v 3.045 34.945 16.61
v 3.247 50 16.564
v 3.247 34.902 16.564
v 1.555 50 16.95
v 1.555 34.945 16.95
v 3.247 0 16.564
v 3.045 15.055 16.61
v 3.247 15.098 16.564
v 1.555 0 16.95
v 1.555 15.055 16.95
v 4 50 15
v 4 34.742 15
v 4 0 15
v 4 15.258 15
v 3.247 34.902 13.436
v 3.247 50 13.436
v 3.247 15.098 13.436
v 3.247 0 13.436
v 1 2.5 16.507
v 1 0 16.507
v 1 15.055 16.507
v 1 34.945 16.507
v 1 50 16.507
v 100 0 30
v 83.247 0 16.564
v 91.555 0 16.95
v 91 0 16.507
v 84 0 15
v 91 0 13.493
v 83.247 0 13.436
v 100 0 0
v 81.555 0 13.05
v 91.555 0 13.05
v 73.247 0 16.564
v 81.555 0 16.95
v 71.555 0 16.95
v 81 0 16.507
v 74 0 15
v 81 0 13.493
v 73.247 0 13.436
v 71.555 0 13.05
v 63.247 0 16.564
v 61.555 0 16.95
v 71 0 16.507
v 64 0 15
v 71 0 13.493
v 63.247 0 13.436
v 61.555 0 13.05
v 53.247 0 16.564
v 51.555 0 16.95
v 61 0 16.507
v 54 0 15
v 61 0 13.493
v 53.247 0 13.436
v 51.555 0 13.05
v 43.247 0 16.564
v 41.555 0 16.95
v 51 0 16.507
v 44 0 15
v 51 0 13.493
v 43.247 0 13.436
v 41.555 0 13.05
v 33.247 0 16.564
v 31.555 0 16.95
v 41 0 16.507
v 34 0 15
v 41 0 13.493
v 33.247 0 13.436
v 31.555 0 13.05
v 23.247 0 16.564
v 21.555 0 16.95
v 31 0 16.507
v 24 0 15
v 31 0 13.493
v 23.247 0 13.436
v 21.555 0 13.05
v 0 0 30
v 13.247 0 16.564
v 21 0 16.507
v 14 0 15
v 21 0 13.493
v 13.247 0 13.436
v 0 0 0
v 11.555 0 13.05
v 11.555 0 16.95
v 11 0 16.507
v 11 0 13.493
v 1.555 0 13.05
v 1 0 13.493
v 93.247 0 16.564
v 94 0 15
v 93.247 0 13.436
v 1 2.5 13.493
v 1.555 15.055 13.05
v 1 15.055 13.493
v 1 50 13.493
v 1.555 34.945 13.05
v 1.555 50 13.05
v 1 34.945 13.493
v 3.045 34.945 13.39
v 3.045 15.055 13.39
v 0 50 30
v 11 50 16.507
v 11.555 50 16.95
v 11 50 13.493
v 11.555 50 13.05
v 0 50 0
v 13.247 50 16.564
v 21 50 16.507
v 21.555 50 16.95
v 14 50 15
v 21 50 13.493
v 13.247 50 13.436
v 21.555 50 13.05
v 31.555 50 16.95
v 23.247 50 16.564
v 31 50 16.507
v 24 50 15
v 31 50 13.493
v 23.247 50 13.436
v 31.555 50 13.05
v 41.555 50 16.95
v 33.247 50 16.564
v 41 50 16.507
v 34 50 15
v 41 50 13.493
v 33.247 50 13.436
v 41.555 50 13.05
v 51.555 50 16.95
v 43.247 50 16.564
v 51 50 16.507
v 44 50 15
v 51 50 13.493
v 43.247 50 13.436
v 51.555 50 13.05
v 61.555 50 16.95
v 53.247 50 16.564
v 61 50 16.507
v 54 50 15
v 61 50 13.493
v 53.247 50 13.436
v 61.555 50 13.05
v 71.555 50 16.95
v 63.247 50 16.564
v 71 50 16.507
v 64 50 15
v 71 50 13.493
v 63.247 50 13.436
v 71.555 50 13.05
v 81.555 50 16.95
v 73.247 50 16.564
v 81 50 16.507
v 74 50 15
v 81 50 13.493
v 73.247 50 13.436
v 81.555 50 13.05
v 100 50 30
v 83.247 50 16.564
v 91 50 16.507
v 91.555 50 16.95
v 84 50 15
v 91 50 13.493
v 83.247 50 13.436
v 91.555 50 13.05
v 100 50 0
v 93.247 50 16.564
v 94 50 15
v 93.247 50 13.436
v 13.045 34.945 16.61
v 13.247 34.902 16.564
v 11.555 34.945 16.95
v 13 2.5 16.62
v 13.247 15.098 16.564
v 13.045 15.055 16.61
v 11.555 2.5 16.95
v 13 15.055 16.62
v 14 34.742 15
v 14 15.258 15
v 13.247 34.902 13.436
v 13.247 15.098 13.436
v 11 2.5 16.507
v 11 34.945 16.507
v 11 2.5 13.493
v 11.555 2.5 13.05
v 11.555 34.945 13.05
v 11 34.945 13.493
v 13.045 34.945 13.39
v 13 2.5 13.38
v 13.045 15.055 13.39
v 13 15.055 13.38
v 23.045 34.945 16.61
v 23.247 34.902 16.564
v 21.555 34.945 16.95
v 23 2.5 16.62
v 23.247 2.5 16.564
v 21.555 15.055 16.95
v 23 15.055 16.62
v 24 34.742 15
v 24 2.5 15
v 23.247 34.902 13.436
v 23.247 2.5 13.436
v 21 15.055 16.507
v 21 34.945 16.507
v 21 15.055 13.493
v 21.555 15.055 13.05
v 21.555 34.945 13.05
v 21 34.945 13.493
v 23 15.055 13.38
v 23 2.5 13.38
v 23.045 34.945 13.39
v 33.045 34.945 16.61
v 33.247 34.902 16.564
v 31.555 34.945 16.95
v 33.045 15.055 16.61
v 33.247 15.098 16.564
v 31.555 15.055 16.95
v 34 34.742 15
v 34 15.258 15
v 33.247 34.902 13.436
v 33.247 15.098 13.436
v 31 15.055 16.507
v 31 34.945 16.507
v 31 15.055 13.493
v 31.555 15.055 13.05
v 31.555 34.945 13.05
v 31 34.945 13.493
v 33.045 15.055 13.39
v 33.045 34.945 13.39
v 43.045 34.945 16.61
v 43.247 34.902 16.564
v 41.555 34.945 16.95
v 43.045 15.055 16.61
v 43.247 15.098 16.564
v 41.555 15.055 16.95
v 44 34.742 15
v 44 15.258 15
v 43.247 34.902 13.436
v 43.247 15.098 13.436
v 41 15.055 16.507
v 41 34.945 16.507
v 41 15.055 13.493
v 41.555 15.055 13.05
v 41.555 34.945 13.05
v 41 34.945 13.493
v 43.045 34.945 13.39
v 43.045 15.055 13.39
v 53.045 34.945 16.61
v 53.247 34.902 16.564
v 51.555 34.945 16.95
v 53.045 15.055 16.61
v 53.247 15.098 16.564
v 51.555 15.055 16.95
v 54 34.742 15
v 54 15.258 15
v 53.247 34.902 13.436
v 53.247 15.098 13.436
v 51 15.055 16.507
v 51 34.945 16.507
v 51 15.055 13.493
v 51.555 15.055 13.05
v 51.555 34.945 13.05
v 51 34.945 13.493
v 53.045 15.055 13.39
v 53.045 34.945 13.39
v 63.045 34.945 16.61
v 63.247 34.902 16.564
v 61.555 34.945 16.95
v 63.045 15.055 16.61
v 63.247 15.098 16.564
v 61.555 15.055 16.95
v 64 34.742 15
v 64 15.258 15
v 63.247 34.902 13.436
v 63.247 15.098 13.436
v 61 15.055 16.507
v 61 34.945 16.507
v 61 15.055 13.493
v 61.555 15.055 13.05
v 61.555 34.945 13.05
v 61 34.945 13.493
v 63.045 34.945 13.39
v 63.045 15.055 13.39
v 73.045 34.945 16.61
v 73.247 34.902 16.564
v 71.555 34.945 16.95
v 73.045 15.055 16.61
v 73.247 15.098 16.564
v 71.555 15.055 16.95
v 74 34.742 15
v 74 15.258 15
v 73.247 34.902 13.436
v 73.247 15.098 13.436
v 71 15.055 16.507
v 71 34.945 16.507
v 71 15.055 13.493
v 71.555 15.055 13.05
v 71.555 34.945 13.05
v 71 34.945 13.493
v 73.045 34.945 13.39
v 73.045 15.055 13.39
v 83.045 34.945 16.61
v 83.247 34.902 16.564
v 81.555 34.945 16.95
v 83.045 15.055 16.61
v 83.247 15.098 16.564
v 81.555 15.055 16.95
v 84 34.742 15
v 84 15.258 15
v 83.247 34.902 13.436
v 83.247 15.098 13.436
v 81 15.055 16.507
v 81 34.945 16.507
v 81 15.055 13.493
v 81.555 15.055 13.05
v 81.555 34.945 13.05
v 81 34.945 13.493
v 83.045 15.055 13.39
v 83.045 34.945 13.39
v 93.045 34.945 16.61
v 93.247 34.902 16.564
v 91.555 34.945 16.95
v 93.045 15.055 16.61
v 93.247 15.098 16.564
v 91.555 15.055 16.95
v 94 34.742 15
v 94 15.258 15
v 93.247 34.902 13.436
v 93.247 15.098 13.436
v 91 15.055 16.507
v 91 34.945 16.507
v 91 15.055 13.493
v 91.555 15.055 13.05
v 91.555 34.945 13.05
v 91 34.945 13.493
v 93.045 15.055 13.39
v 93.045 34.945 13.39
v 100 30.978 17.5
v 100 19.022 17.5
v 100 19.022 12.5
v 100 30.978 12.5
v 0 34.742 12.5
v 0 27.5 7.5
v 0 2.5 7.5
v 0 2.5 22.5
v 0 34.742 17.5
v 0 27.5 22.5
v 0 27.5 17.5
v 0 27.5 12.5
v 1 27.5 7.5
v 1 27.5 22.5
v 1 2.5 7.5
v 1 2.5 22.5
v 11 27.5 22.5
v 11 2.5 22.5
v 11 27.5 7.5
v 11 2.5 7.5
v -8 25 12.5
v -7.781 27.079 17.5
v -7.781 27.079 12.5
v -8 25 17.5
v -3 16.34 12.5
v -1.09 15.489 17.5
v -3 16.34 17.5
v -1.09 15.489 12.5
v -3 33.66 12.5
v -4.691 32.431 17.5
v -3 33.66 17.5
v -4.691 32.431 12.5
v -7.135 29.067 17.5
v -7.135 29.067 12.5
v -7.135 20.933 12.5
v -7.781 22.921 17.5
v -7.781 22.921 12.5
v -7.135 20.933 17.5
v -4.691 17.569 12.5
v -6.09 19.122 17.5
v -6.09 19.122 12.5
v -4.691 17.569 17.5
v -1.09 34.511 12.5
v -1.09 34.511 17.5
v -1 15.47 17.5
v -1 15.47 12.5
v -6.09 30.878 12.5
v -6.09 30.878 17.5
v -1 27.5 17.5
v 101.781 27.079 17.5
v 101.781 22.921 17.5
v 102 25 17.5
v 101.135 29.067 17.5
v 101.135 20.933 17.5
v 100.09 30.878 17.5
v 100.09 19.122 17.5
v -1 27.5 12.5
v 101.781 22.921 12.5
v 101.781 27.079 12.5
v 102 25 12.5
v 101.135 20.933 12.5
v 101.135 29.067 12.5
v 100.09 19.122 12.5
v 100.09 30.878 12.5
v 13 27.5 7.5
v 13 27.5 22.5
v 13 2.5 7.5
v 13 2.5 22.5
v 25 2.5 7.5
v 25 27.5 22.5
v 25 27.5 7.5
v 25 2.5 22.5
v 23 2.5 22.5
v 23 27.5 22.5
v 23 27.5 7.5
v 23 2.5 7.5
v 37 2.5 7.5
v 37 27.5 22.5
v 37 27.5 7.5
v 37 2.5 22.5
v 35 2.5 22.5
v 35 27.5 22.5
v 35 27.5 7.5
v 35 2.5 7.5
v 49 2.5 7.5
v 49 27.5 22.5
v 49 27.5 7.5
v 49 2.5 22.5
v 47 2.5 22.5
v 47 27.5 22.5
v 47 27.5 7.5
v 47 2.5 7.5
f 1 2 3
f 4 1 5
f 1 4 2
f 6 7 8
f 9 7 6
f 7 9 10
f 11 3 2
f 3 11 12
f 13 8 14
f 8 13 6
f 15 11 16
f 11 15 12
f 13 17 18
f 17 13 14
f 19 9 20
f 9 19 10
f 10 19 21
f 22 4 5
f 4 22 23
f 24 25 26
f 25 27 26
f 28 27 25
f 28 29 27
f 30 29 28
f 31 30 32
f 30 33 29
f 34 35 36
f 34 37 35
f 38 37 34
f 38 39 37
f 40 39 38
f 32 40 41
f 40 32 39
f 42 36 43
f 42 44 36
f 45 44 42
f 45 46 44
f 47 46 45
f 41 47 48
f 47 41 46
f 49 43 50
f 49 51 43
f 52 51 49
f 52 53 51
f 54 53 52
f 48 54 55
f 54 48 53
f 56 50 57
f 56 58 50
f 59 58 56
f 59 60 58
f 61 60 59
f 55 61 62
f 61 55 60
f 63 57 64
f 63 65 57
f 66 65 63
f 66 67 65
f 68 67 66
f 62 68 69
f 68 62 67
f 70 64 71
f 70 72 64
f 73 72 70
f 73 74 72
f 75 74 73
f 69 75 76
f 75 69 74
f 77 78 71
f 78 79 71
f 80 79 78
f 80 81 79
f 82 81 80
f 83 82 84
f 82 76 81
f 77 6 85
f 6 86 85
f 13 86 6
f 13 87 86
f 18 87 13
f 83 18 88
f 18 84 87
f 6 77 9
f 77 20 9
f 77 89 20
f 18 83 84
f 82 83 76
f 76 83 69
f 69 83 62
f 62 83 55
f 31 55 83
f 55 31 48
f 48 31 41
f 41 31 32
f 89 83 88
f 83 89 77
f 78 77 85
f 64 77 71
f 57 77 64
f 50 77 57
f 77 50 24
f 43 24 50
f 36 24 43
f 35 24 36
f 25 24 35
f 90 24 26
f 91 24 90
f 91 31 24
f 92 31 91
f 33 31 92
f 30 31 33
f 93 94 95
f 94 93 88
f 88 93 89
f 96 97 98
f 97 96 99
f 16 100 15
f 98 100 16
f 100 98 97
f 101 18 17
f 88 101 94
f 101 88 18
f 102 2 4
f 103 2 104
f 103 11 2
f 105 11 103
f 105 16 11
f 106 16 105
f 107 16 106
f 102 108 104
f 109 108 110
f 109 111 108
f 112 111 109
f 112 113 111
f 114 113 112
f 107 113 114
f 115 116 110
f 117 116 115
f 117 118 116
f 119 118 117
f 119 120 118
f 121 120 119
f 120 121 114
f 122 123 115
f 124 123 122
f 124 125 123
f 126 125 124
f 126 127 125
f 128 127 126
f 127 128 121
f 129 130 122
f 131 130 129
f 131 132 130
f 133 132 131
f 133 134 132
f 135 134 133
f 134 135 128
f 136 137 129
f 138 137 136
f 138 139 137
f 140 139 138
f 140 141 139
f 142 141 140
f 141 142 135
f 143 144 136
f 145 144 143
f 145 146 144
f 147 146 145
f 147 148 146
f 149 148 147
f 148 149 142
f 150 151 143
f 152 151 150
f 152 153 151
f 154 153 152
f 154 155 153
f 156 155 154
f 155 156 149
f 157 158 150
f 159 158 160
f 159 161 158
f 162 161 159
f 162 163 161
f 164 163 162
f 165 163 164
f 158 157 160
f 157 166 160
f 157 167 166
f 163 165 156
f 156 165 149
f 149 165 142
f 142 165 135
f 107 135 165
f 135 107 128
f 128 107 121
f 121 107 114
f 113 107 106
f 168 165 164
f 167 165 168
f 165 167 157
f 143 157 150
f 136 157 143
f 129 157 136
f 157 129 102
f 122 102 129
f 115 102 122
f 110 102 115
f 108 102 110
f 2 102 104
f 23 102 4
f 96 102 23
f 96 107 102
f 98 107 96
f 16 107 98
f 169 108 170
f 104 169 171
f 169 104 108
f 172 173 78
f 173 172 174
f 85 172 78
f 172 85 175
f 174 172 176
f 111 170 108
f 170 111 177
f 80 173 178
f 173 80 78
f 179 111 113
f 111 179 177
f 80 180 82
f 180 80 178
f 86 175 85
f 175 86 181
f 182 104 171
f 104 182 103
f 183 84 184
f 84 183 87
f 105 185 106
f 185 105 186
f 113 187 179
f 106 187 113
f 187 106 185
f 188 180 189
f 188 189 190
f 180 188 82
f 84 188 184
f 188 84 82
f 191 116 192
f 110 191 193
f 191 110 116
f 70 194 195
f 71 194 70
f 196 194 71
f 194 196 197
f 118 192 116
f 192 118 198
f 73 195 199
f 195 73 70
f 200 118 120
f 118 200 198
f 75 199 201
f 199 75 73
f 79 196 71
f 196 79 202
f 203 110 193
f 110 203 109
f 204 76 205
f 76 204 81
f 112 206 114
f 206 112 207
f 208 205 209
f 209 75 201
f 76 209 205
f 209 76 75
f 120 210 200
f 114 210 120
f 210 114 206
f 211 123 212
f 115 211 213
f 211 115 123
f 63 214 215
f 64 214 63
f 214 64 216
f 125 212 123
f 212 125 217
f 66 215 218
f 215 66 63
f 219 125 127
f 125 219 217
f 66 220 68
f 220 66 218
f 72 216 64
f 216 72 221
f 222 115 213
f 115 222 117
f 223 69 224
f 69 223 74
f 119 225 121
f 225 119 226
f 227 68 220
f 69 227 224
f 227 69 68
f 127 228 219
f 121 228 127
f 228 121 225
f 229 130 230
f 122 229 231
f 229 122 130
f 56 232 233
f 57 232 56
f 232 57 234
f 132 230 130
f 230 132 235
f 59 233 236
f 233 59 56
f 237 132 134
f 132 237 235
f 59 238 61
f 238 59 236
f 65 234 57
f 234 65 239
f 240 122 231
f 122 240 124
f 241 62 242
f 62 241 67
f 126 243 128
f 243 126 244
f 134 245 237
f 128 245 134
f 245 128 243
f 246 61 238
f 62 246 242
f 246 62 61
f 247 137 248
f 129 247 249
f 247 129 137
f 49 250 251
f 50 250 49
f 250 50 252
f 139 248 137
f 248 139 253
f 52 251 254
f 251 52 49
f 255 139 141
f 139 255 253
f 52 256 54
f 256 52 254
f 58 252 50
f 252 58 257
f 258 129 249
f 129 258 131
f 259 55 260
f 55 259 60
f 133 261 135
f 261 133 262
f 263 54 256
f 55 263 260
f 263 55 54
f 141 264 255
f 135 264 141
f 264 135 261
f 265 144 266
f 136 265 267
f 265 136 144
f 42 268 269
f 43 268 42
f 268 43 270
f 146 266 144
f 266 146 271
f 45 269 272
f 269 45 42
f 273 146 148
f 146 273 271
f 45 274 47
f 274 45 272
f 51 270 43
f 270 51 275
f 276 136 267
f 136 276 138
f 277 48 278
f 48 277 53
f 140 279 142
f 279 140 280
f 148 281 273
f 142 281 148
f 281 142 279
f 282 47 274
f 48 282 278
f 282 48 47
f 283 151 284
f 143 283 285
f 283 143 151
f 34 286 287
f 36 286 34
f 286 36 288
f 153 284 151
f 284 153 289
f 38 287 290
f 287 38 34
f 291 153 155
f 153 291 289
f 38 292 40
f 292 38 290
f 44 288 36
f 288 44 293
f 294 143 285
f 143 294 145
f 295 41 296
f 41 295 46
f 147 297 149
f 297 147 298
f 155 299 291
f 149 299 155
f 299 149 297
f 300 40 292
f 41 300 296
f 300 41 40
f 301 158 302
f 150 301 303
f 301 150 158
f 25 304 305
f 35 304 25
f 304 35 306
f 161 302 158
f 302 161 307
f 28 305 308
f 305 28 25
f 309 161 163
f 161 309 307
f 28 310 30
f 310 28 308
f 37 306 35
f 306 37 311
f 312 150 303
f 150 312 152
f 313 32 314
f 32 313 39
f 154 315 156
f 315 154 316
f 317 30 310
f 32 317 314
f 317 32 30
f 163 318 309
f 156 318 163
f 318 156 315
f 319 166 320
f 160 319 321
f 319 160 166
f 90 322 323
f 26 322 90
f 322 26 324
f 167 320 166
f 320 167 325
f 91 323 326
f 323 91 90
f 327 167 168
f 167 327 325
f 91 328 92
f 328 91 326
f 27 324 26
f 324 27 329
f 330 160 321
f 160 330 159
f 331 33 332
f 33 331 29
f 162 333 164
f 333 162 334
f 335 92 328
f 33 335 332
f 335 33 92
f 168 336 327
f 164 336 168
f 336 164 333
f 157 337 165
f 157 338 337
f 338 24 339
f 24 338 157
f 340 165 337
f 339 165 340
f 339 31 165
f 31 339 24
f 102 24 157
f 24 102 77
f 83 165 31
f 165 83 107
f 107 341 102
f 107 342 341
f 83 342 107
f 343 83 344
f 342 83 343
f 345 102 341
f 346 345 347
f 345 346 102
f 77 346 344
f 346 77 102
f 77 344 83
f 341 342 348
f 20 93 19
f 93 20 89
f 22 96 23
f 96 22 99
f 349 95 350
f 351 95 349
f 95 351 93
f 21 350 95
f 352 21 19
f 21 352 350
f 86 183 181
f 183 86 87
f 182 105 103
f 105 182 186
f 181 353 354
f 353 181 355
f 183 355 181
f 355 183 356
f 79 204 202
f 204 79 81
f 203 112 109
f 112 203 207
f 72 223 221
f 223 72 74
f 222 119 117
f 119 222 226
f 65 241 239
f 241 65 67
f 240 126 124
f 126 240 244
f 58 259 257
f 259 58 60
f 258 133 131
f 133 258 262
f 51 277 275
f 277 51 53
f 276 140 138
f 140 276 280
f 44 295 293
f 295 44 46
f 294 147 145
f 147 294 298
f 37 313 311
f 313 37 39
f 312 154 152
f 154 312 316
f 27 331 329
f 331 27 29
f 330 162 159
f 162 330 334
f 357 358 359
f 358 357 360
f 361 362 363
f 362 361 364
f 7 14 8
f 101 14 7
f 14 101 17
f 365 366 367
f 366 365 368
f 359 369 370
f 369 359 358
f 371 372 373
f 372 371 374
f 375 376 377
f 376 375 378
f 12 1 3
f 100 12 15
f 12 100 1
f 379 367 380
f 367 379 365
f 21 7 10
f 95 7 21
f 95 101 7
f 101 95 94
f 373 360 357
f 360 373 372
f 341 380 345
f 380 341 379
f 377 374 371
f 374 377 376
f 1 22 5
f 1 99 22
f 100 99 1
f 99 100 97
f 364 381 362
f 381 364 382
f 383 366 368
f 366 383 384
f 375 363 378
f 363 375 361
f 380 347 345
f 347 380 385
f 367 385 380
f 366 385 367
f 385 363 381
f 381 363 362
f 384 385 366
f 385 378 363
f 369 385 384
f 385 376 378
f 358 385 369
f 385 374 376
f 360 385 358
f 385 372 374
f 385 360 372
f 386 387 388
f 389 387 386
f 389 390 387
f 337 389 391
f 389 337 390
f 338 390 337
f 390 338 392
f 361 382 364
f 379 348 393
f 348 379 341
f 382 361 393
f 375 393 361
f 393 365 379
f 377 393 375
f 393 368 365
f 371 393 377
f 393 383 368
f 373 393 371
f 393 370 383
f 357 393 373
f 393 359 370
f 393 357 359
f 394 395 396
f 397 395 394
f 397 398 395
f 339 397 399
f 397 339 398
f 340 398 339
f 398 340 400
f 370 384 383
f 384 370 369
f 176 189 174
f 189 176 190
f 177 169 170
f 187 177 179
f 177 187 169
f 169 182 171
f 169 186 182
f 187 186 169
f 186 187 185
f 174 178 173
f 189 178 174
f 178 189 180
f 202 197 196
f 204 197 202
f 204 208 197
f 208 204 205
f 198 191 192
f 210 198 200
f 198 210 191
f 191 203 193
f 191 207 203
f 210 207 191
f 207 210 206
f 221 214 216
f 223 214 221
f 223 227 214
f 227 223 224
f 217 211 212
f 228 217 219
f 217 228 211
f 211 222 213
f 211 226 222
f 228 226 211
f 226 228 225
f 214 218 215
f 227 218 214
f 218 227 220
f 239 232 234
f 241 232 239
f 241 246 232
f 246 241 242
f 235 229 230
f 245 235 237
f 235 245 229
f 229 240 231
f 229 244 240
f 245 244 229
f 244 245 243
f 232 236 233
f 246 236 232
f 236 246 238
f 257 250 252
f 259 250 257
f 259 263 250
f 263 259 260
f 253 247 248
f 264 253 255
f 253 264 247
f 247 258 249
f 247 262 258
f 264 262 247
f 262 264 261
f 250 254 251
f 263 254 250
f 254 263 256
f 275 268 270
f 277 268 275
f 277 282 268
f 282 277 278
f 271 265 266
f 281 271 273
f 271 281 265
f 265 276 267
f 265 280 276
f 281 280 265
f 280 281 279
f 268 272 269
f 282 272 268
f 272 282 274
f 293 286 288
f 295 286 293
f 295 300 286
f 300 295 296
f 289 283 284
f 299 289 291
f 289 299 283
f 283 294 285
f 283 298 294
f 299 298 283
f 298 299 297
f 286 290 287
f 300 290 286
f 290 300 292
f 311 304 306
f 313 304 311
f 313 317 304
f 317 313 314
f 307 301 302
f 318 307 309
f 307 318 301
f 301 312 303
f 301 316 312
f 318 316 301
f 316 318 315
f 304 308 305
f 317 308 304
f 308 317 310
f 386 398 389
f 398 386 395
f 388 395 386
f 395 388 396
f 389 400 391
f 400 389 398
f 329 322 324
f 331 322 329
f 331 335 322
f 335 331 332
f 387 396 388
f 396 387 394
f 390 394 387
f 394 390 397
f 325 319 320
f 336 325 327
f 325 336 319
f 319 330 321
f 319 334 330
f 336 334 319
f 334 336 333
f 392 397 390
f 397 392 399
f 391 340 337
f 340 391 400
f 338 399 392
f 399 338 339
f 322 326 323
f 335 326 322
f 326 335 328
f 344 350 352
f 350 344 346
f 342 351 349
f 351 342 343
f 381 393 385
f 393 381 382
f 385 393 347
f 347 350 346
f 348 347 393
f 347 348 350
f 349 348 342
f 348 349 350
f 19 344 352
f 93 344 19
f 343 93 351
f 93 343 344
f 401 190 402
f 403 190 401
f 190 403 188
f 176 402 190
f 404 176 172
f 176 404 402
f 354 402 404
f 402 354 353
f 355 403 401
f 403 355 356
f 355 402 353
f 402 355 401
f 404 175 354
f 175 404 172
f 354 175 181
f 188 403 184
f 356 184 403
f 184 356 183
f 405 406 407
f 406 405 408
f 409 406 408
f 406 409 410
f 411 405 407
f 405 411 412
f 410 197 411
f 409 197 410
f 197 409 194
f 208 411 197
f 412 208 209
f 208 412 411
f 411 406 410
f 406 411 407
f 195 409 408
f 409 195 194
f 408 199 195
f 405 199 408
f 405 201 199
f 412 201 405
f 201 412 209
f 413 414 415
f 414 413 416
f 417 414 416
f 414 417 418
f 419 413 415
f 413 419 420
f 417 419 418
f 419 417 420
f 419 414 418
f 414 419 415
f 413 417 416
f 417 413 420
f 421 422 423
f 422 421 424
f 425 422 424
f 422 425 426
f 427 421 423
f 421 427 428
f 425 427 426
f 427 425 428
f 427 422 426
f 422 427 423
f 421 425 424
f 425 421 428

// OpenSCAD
difference() {
	union() {
		difference() {
			difference() {
				cube(center = false, size = [100, 50, 30]);
				union() {
					translate(v = [2.0000000000, 25.0000000000, 15.0000000000]) {
						rotate(a = [90, 0, 0]) {
							cylinder(center = true, h = 50, r = 2);
						}
					}
					translate(v = [12.0000000000, 25.0000000000, 15.0000000000]) {
						rotate(a = [90, 0, 0]) {
							cylinder(center = true, h = 50, r = 2);
						}
					}
					translate(v = [22.0000000000, 25.0000000000, 15.0000000000]) {
						rotate(a = [90, 0, 0]) {
							cylinder(center = true, h = 50, r = 2);
						}
					}
					translate(v = [32.0000000000, 25.0000000000, 15.0000000000]) {
						rotate(a = [90, 0, 0]) {
							cylinder(center = true, h = 50, r = 2);
						}
					}
					translate(v = [42.0000000000, 25.0000000000, 15.0000000000]) {
						rotate(a = [90, 0, 0]) {
							cylinder(center = true, h = 50, r = 2);
						}
					}
					translate(v = [52.0000000000, 25.0000000000, 15.0000000000]) {
						rotate(a = [90, 0, 0]) {
							cylinder(center = true, h = 50, r = 2);
						}
					}
					translate(v = [62.0000000000, 25.0000000000, 15.0000000000]) {
						rotate(a = [90, 0, 0]) {
							cylinder(center = true, h = 50, r = 2);
						}
					}
					translate(v = [72.0000000000, 25.0000000000, 15.0000000000]) {
						rotate(a = [90, 0, 0]) {
							cylinder(center = true, h = 50, r = 2);
						}
					}
					translate(v = [82.0000000000, 25.0000000000, 15.0000000000]) {
						rotate(a = [90, 0, 0]) {
							cylinder(center = true, h = 50, r = 2);
						}
					}
					translate(v = [92.0000000000, 25.0000000000, 15.0000000000]) {
						rotate(a = [90, 0, 0]) {
							cylinder(center = true, h = 50, r = 2);
						}
					}
				}
			}
		}
		union() {
			translate(v = [0, 0, 0]) {
				cube(center = false, size = [1, 50, 30]);
			}
			translate(v = [5, 0, 0]) {
				cube(center = false, size = [1, 50, 30]);
			}
			translate(v = [10, 0, 0]) {
				cube(center = false, size = [1, 50, 30]);
			}
			translate(v = [15, 0, 0]) {
				cube(center = false, size = [1, 50, 30]);
			}
			translate(v = [20, 0, 0]) {
				cube(center = false, size = [1, 50, 30]);
			}
			translate(v = [25, 0, 0]) {
				cube(center = false, size = [1, 50, 30]);
			}
			translate(v = [30, 0, 0]) {
				cube(center = false, size = [1, 50, 30]);
			}
			translate(v = [35, 0, 0]) {
				cube(center = false, size = [1, 50, 30]);
			}
			translate(v = [40, 0, 0]) {
				cube(center = false, size = [1, 50, 30]);
			}
			translate(v = [45, 0, 0]) {
				cube(center = false, size = [1, 50, 30]);
			}
			translate(v = [50, 0, 0]) {
				cube(center = false, size = [1, 50, 30]);
			}
			translate(v = [55, 0, 0]) {
				cube(center = false, size = [1, 50, 30]);
			}
			translate(v = [60, 0, 0]) {
				cube(center = false, size = [1, 50, 30]);
			}
			translate(v = [65, 0, 0]) {
				cube(center = false, size = [1, 50, 30]);
			}
			translate(v = [70, 0, 0]) {
				cube(center = false, size = [1, 50, 30]);
			}
			translate(v = [75, 0, 0]) {
				cube(center = false, size = [1, 50, 30]);
			}
			translate(v = [80, 0, 0]) {
				cube(center = false, size = [1, 50, 30]);
			}
			translate(v = [85, 0, 0]) {
				cube(center = false, size = [1, 50, 30]);
			}
			translate(v = [90, 0, 0]) {
				cube(center = false, size = [1, 50, 30]);
			}
			translate(v = [95, 0, 0]) {
				cube(center = false, size = [1, 50, 30]);
			}
		}
		union() {
			translate(v = [2.0000000000, 25.0000000000, 15.0000000000]) {
				cylinder(center = true, h = 5, r = 10.0000000000);
			}
			translate(v = [12.0000000000, 25.0000000000, 15.0000000000]) {
				cylinder(center = true, h = 5, r = 10.0000000000);
			}
			translate(v = [22.0000000000, 25.0000000000, 15.0000000000]) {
				cylinder(center = true, h = 5, r = 10.0000000000);
			}
			translate(v = [32.0000000000, 25.0000000000, 15.0000000000]) {
				cylinder(center = true, h = 5, r = 10.0000000000);
			}
			translate(v = [42.0000000000, 25.0000000000, 15.0000000000]) {
				cylinder(center = true, h = 5, r = 10.0000000000);
			}
			translate(v = [52.0000000000, 25.0000000000, 15.0000000000]) {
				cylinder(center = true, h = 5, r = 10.0000000000);
			}
			translate(v = [62.0000000000, 25.0000000000, 15.0000000000]) {
				cylinder(center = true, h = 5, r = 10.0000000000);
			}
			translate(v = [72.0000000000, 25.0000000000, 15.0000000000]) {
				cylinder(center = true, h = 5, r = 10.0000000000);
			}
			translate(v = [82.0000000000, 25.0000000000, 15.0000000000]) {
				cylinder(center = true, h = 5, r = 10.0000000000);
			}
			translate(v = [92.0000000000, 25.0000000000, 15.0000000000]) {
				cylinder(center = true, h = 5, r = 10.0000000000);
			}
		}
		union() {
			translate(v = [0, 0, 0]) {
				cube(center = false, size = [1, 50, 30]);
			}
			translate(v = [10, 0, 0]) {
				cube(center = false, size = [1, 50, 30]);
			}
			translate(v = [20, 0, 0]) {
				cube(center = false, size = [1, 50, 30]);
			}
			translate(v = [30, 0, 0]) {
				cube(center = false, size = [1, 50, 30]);
			}
			translate(v = [40, 0, 0]) {
				cube(center = false, size = [1, 50, 30]);
			}
		}
	}
	union() {
		translate(v = [0, 15.0000000000, 15.0000000000]) {
			cube(center = true, size = [2, 25.0000000000, 15.0000000000]);
		}
		translate(v = [12, 15.0000000000, 15.0000000000]) {
			cube(center = true, size = [2, 25.0000000000, 15.0000000000]);
		}
		translate(v = [24, 15.0000000000, 15.0000000000]) {
			cube(center = true, size = [2, 25.0000000000, 15.0000000000]);
		}
		translate(v = [36, 15.0000000000, 15.0000000000]) {
			cube(center = true, size = [2, 25.0000000000, 15.0000000000]);
		}
		translate(v = [48, 15.0000000000, 15.0000000000]) {
			cube(center = true, size = [2, 25.0000000000, 15.0000000000]);
		}
	}
}
